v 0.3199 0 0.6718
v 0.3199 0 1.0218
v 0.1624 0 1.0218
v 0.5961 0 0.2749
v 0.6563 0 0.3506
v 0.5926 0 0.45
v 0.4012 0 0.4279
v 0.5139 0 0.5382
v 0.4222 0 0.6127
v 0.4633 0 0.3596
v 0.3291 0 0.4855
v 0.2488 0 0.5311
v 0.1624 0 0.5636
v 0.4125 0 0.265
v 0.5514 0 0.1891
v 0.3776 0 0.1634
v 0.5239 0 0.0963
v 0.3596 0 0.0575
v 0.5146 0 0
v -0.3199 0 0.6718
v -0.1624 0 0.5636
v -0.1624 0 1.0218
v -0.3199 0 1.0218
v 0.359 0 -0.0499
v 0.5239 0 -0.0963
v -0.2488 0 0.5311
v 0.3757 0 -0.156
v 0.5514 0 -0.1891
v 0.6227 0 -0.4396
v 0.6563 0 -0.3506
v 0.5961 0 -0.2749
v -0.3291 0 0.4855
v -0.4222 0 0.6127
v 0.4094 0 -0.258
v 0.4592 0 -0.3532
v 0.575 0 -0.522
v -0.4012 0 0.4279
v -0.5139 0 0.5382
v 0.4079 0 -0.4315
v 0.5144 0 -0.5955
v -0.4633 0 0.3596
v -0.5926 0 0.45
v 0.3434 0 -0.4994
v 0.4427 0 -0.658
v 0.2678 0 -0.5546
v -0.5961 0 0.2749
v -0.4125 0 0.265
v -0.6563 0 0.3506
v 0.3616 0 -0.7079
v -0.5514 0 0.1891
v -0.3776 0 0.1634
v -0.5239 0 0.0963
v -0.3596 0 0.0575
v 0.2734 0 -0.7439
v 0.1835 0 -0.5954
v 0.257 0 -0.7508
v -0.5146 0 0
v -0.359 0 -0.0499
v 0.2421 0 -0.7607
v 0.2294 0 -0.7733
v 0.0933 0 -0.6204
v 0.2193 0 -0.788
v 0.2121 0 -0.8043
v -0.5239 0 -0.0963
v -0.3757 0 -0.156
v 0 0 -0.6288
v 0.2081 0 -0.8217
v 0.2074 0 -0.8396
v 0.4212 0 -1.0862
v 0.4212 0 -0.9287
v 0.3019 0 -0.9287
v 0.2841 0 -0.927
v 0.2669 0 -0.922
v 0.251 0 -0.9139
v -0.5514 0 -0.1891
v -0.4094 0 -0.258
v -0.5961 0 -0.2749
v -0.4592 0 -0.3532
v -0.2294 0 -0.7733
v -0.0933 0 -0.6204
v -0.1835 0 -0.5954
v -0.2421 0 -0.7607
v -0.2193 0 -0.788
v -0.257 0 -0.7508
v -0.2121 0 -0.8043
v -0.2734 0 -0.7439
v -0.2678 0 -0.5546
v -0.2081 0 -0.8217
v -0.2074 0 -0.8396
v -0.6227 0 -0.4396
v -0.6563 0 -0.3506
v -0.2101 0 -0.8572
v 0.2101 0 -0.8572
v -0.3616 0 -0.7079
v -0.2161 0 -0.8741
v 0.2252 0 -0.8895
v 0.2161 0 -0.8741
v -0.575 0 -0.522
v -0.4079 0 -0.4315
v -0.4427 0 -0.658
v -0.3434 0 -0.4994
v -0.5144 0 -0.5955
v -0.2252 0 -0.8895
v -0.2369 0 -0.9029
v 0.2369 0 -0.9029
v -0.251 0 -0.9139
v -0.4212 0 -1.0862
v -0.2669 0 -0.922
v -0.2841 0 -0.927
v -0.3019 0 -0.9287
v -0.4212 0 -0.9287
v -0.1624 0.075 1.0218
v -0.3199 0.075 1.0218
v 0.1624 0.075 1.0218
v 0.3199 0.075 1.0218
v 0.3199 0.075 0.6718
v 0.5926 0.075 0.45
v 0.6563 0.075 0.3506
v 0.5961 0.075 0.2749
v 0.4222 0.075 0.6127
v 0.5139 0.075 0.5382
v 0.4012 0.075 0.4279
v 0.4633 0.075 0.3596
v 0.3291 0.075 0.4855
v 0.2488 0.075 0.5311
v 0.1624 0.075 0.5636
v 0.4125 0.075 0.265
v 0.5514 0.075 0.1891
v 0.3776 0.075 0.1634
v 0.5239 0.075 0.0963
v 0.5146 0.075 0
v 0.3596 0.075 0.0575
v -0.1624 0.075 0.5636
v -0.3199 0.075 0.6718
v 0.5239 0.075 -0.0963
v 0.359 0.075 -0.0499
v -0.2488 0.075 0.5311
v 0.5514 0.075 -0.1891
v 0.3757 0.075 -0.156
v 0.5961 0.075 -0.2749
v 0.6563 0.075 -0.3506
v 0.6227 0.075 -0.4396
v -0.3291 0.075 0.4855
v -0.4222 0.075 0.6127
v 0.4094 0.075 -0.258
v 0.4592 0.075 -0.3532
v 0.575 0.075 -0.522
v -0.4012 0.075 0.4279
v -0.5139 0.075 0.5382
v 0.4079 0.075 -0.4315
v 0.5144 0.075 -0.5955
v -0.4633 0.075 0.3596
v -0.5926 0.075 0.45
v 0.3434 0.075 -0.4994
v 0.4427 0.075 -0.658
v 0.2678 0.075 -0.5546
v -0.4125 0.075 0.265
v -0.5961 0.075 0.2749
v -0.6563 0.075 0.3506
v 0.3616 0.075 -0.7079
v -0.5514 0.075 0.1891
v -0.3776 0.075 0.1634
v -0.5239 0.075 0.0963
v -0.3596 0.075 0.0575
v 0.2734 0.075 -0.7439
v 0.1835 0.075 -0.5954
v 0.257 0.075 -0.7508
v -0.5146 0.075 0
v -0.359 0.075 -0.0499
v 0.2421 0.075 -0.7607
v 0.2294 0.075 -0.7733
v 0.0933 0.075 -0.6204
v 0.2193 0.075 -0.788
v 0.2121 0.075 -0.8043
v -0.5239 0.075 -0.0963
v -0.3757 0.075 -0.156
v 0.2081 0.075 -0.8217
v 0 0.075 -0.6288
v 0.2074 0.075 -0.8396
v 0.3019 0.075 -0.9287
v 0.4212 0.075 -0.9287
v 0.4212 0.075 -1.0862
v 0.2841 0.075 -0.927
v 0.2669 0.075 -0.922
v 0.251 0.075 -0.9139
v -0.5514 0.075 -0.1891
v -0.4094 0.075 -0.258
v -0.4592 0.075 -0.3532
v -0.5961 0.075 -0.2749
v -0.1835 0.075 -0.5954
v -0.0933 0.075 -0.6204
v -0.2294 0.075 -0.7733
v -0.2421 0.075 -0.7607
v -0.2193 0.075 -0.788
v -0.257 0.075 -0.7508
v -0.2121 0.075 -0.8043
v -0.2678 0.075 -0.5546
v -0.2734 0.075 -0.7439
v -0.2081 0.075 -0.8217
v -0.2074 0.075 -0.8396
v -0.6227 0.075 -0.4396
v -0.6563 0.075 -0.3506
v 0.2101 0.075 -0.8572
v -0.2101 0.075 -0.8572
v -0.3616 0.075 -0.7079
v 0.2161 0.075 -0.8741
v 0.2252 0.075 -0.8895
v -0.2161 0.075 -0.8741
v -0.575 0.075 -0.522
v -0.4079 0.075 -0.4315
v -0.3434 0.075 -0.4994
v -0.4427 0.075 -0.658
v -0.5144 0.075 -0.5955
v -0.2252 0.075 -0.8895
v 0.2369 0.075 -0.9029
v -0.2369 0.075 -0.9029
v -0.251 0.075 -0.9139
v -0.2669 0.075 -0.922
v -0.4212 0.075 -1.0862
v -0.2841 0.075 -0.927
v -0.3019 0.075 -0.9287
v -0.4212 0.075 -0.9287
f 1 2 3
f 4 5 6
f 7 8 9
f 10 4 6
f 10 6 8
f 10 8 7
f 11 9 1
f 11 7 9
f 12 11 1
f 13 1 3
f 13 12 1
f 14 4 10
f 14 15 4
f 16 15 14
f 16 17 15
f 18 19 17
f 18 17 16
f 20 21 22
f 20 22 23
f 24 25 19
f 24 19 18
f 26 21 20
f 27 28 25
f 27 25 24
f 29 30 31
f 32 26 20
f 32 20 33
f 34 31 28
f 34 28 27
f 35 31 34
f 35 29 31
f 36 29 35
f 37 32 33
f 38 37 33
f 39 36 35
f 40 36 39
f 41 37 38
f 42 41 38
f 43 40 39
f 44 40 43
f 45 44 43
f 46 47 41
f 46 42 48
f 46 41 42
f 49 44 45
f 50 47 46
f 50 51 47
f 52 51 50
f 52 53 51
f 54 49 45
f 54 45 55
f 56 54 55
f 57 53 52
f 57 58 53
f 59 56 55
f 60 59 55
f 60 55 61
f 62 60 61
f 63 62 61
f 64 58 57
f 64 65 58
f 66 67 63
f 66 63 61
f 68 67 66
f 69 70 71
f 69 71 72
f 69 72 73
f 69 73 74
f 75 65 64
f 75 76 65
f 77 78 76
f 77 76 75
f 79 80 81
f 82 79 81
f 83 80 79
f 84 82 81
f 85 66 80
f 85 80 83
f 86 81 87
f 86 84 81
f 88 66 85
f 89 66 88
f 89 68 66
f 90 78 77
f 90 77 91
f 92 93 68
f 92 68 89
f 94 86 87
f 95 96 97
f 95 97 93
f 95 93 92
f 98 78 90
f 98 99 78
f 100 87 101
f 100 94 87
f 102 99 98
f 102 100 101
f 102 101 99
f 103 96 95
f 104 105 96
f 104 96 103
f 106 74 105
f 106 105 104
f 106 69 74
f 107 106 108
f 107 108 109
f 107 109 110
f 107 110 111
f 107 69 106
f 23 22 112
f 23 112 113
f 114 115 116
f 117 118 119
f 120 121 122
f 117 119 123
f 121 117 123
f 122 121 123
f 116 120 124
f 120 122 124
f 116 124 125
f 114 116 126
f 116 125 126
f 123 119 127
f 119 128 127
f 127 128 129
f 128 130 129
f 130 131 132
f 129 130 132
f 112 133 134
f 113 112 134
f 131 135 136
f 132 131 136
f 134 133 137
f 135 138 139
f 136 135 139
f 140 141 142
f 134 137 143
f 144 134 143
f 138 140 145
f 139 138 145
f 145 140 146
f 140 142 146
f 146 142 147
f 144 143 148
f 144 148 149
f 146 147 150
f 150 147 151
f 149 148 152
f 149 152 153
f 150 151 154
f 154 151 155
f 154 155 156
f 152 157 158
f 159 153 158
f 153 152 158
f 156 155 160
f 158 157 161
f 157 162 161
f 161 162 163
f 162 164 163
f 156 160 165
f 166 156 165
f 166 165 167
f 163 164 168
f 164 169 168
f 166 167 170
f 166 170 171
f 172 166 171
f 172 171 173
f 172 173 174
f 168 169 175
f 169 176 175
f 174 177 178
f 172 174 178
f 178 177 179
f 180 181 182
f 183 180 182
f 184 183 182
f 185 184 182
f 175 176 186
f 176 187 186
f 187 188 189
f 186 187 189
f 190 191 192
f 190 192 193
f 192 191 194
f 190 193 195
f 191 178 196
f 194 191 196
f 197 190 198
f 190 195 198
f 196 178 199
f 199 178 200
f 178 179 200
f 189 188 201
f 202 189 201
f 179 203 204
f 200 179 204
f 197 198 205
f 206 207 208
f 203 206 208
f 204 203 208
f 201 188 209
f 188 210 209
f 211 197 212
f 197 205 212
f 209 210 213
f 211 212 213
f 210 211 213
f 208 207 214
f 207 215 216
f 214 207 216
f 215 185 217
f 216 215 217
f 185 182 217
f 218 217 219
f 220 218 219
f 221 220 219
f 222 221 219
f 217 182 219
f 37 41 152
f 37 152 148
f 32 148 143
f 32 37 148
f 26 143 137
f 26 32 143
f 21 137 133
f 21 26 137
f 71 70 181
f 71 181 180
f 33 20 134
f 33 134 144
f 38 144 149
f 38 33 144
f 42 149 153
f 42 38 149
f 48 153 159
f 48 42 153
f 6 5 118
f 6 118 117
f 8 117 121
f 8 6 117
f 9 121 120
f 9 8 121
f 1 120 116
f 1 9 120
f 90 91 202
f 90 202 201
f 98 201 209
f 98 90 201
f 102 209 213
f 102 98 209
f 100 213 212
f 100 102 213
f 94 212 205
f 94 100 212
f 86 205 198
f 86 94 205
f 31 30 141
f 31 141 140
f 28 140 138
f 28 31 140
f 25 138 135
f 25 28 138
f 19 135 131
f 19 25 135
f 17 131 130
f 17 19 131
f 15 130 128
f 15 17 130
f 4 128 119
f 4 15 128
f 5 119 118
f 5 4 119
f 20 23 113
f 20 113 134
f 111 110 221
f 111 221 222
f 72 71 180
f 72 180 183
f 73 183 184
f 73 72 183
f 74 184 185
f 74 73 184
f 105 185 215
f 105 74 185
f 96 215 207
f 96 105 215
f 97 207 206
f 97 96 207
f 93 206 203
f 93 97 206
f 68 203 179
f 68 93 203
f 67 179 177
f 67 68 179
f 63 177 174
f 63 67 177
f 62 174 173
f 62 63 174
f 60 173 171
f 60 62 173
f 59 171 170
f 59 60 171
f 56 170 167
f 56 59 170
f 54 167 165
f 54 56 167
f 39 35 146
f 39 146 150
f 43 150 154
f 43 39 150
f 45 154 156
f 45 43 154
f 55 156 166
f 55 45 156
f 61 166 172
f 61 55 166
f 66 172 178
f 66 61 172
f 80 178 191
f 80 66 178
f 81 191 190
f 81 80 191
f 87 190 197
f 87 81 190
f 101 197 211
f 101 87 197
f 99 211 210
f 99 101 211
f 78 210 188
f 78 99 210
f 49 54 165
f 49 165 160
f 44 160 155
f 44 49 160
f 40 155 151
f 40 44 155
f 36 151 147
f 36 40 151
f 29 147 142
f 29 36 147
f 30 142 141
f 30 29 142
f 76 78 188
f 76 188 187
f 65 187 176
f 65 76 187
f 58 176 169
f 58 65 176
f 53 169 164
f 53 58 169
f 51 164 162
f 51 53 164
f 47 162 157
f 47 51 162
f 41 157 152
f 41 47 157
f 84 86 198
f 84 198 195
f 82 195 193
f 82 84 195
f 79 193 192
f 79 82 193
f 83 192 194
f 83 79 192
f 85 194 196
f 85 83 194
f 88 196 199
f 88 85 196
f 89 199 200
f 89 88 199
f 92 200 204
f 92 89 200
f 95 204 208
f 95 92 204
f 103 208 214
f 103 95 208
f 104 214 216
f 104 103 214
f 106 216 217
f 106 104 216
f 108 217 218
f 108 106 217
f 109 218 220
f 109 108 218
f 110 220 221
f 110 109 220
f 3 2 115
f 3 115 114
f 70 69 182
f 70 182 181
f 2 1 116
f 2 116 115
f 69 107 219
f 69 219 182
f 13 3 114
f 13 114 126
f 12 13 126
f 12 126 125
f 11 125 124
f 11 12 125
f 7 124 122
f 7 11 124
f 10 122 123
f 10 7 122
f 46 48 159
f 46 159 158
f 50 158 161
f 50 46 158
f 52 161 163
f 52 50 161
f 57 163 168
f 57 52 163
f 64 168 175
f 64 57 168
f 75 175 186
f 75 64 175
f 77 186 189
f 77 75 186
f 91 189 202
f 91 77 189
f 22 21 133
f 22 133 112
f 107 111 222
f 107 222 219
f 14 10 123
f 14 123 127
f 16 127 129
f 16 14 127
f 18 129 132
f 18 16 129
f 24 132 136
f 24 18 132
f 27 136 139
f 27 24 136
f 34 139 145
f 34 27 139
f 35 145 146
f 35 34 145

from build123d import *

# Parameters (mm, degrees)
BOSS_EXTRUDE1_DEPTH = 0.075


with BuildPart() as part:
    # Sketch1 → Boss-Extrude1 (new body)
    with BuildSketch(Plane(origin=(0, 0, 0), x_dir=(1, 0, 0), z_dir=(0, 1, 0))):
        with BuildLine():
            Line((-0.4212, 1.0862), (0.4212, 1.0862))
            Line((0.4212, 1.0862), (0.4212, 0.9287))
            Line((0.4212, 0.9287), (0.30186515, 0.9287))
            ThreePointArc((0.30186515, 0.9287), (0.208363685, 0.848474841), (0.273449322, 0.743868627))
            ThreePointArc((0.273449322, 0.743868627), (0.514449909, 0.595458709), (0.656331281, 0.350557785))
            ThreePointArc((0.656331281, 0.350557785), (0.5146, -8.225e-06), (0.656342713, -0.350569612))
            ThreePointArc((0.656342713, -0.350569612), (0.513871298, -0.538164565), (0.3199, -0.671824977))
            Line((0.3199, -0.671824977), (0.3199, -1.0218))
            Line((0.3199, -1.0218), (0.1624, -1.0218))
            Line((0.1624, -1.0218), (0.1624, -0.563567645))
            ThreePointArc((0.1624, -0.563567645), (0.32905661, -0.485493561), (0.463312875, -0.359615669))
            ThreePointArc((0.463312875, -0.359615669), (0.357111084, -0.003830472), (0.459187913, 0.353160072))
            ThreePointArc((0.459187913, 0.353160072), (0, 0.6288), (-0.459187913, 0.353160072))
            ThreePointArc((-0.459187913, 0.353160072), (-0.357111084, -0.003830472), (-0.463312875, -0.359615669))
            ThreePointArc((-0.463312875, -0.359615669), (-0.32905661, -0.485493561), (-0.1624, -0.563567645))
            Line((-0.1624, -0.563567645), (-0.1624, -1.0218))
            Line((-0.1624, -1.0218), (-0.3199, -1.0218))
            Line((-0.3199, -1.0218), (-0.3199, -0.671824977))
            ThreePointArc((-0.3199, -0.671824977), (-0.513871298, -0.538164565), (-0.656342713, -0.350569612))
            ThreePointArc((-0.656342713, -0.350569612), (-0.5146, -8.225e-06), (-0.656331281, 0.350557785))
            ThreePointArc((-0.656331281, 0.350557785), (-0.514449909, 0.595458709), (-0.273449322, 0.743868627))
            ThreePointArc((-0.273449322, 0.743868627), (-0.208363685, 0.848474841), (-0.30186515, 0.9287))
            Line((-0.30186515, 0.9287), (-0.4212, 0.9287))
            Line((-0.4212, 0.9287), (-0.4212, 1.0862))
        make_face()
    extrude(amount=BOSS_EXTRUDE1_DEPTH)


solid = part.part
